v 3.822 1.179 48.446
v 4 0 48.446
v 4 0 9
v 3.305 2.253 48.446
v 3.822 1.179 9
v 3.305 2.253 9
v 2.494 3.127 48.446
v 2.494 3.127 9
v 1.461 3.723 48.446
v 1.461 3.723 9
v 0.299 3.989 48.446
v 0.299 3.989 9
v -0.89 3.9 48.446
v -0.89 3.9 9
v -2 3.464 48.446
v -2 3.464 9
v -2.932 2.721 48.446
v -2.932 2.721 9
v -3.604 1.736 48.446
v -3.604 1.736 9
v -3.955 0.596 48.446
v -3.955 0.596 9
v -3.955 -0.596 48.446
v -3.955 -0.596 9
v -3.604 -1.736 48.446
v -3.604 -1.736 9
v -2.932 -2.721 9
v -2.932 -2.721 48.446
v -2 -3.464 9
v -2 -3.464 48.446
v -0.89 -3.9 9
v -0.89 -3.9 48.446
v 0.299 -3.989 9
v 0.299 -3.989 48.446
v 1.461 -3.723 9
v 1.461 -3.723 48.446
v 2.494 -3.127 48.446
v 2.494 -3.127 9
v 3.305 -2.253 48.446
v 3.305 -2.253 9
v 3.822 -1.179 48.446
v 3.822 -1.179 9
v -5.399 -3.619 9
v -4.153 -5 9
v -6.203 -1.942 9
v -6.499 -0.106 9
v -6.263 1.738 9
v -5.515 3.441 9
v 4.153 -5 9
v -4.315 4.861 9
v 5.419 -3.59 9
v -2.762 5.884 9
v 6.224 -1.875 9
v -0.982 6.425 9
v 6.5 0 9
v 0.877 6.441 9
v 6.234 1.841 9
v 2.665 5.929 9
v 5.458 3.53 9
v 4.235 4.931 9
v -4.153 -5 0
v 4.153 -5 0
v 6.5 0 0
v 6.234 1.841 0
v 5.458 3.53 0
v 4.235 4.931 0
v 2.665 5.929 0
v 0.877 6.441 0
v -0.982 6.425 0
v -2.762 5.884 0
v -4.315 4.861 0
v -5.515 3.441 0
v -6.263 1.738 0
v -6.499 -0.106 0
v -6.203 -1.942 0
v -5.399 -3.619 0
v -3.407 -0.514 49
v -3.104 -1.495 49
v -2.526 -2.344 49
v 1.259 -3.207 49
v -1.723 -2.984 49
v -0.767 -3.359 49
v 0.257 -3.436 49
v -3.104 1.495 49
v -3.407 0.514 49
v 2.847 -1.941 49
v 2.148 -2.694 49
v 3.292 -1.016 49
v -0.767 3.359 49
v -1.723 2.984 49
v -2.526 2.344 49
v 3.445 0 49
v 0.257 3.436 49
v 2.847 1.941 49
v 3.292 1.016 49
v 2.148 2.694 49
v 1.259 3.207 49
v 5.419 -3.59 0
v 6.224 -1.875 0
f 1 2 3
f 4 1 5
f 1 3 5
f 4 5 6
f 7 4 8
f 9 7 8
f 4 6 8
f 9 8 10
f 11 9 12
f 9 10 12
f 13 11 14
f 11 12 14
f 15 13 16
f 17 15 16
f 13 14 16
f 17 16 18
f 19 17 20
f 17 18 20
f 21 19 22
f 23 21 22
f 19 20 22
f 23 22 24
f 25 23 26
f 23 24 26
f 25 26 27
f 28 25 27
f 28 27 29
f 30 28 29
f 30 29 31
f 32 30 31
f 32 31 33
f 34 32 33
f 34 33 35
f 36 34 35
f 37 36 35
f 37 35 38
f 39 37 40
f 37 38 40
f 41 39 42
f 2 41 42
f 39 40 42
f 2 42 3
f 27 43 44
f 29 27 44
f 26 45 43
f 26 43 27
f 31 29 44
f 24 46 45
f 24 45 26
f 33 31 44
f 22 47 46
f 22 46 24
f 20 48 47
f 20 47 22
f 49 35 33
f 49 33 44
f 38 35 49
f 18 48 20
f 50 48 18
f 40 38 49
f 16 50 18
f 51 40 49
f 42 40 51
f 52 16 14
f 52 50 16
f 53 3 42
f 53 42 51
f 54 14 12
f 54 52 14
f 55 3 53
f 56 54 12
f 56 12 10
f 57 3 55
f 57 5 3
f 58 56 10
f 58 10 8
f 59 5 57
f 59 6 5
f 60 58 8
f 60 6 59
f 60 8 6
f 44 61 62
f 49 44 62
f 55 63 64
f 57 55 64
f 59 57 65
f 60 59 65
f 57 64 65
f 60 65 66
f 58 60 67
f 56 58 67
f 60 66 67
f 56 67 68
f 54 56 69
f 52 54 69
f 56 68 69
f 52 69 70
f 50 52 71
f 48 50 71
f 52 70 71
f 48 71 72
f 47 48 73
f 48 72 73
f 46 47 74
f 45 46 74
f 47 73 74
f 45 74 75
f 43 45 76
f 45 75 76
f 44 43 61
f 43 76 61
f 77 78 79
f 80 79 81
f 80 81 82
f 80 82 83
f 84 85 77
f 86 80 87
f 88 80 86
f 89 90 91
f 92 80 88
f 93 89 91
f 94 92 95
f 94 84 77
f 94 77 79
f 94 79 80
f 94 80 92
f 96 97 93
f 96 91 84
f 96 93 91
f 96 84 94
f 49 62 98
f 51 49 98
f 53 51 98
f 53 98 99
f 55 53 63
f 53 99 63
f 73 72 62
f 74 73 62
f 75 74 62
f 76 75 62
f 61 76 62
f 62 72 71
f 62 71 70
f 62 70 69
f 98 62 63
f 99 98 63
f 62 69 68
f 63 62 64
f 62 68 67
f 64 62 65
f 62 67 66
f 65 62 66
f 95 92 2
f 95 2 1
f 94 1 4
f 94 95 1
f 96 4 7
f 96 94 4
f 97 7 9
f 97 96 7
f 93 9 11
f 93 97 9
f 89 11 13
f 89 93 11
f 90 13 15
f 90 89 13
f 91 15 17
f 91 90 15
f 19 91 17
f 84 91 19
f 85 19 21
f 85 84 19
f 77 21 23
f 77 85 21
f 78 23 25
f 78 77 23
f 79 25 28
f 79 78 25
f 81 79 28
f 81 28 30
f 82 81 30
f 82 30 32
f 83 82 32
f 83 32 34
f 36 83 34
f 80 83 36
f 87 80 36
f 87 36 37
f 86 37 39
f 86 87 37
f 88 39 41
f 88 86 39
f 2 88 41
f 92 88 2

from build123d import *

# Parameters (mm, degrees)
EXTRUDE_1_DEPTH = 9
SKETCH_2_R      = 4
EXTRUDE_2_DEPTH = 40
CHAMFER_1_SIZE  = 0.5545


with BuildPart() as part:
    # Эскиз1 → Бобышка-Вытянуть1 (new body)
    with BuildSketch(Plane.XY):
        with BuildLine():
            ThreePointArc((6.5, 0), (-2.761654617, 5.884153616), (-4.153311931, -5))
            Line((-4.153311931, -5), (4.153311931, -5))
            ThreePointArc((4.153311931, -5), (5.884153616, -2.761654617), (6.5, 0))
        make_face()
    extrude(amount=EXTRUDE_1_DEPTH)

    # Эскиз2 → Бобышка-Вытянуть2 (add)
    with BuildSketch(Plane.XY.offset(9)):
        Circle(SKETCH_2_R)
    extrude(amount=EXTRUDE_2_DEPTH)

    # Фаска1
    chamfer_1_edges = [part.edges().sort_by_distance(p)[0] for p in [
        (-4, 0, 49),
    ]]
    chamfer(chamfer_1_edges, length=CHAMFER_1_SIZE)


solid = part.part
